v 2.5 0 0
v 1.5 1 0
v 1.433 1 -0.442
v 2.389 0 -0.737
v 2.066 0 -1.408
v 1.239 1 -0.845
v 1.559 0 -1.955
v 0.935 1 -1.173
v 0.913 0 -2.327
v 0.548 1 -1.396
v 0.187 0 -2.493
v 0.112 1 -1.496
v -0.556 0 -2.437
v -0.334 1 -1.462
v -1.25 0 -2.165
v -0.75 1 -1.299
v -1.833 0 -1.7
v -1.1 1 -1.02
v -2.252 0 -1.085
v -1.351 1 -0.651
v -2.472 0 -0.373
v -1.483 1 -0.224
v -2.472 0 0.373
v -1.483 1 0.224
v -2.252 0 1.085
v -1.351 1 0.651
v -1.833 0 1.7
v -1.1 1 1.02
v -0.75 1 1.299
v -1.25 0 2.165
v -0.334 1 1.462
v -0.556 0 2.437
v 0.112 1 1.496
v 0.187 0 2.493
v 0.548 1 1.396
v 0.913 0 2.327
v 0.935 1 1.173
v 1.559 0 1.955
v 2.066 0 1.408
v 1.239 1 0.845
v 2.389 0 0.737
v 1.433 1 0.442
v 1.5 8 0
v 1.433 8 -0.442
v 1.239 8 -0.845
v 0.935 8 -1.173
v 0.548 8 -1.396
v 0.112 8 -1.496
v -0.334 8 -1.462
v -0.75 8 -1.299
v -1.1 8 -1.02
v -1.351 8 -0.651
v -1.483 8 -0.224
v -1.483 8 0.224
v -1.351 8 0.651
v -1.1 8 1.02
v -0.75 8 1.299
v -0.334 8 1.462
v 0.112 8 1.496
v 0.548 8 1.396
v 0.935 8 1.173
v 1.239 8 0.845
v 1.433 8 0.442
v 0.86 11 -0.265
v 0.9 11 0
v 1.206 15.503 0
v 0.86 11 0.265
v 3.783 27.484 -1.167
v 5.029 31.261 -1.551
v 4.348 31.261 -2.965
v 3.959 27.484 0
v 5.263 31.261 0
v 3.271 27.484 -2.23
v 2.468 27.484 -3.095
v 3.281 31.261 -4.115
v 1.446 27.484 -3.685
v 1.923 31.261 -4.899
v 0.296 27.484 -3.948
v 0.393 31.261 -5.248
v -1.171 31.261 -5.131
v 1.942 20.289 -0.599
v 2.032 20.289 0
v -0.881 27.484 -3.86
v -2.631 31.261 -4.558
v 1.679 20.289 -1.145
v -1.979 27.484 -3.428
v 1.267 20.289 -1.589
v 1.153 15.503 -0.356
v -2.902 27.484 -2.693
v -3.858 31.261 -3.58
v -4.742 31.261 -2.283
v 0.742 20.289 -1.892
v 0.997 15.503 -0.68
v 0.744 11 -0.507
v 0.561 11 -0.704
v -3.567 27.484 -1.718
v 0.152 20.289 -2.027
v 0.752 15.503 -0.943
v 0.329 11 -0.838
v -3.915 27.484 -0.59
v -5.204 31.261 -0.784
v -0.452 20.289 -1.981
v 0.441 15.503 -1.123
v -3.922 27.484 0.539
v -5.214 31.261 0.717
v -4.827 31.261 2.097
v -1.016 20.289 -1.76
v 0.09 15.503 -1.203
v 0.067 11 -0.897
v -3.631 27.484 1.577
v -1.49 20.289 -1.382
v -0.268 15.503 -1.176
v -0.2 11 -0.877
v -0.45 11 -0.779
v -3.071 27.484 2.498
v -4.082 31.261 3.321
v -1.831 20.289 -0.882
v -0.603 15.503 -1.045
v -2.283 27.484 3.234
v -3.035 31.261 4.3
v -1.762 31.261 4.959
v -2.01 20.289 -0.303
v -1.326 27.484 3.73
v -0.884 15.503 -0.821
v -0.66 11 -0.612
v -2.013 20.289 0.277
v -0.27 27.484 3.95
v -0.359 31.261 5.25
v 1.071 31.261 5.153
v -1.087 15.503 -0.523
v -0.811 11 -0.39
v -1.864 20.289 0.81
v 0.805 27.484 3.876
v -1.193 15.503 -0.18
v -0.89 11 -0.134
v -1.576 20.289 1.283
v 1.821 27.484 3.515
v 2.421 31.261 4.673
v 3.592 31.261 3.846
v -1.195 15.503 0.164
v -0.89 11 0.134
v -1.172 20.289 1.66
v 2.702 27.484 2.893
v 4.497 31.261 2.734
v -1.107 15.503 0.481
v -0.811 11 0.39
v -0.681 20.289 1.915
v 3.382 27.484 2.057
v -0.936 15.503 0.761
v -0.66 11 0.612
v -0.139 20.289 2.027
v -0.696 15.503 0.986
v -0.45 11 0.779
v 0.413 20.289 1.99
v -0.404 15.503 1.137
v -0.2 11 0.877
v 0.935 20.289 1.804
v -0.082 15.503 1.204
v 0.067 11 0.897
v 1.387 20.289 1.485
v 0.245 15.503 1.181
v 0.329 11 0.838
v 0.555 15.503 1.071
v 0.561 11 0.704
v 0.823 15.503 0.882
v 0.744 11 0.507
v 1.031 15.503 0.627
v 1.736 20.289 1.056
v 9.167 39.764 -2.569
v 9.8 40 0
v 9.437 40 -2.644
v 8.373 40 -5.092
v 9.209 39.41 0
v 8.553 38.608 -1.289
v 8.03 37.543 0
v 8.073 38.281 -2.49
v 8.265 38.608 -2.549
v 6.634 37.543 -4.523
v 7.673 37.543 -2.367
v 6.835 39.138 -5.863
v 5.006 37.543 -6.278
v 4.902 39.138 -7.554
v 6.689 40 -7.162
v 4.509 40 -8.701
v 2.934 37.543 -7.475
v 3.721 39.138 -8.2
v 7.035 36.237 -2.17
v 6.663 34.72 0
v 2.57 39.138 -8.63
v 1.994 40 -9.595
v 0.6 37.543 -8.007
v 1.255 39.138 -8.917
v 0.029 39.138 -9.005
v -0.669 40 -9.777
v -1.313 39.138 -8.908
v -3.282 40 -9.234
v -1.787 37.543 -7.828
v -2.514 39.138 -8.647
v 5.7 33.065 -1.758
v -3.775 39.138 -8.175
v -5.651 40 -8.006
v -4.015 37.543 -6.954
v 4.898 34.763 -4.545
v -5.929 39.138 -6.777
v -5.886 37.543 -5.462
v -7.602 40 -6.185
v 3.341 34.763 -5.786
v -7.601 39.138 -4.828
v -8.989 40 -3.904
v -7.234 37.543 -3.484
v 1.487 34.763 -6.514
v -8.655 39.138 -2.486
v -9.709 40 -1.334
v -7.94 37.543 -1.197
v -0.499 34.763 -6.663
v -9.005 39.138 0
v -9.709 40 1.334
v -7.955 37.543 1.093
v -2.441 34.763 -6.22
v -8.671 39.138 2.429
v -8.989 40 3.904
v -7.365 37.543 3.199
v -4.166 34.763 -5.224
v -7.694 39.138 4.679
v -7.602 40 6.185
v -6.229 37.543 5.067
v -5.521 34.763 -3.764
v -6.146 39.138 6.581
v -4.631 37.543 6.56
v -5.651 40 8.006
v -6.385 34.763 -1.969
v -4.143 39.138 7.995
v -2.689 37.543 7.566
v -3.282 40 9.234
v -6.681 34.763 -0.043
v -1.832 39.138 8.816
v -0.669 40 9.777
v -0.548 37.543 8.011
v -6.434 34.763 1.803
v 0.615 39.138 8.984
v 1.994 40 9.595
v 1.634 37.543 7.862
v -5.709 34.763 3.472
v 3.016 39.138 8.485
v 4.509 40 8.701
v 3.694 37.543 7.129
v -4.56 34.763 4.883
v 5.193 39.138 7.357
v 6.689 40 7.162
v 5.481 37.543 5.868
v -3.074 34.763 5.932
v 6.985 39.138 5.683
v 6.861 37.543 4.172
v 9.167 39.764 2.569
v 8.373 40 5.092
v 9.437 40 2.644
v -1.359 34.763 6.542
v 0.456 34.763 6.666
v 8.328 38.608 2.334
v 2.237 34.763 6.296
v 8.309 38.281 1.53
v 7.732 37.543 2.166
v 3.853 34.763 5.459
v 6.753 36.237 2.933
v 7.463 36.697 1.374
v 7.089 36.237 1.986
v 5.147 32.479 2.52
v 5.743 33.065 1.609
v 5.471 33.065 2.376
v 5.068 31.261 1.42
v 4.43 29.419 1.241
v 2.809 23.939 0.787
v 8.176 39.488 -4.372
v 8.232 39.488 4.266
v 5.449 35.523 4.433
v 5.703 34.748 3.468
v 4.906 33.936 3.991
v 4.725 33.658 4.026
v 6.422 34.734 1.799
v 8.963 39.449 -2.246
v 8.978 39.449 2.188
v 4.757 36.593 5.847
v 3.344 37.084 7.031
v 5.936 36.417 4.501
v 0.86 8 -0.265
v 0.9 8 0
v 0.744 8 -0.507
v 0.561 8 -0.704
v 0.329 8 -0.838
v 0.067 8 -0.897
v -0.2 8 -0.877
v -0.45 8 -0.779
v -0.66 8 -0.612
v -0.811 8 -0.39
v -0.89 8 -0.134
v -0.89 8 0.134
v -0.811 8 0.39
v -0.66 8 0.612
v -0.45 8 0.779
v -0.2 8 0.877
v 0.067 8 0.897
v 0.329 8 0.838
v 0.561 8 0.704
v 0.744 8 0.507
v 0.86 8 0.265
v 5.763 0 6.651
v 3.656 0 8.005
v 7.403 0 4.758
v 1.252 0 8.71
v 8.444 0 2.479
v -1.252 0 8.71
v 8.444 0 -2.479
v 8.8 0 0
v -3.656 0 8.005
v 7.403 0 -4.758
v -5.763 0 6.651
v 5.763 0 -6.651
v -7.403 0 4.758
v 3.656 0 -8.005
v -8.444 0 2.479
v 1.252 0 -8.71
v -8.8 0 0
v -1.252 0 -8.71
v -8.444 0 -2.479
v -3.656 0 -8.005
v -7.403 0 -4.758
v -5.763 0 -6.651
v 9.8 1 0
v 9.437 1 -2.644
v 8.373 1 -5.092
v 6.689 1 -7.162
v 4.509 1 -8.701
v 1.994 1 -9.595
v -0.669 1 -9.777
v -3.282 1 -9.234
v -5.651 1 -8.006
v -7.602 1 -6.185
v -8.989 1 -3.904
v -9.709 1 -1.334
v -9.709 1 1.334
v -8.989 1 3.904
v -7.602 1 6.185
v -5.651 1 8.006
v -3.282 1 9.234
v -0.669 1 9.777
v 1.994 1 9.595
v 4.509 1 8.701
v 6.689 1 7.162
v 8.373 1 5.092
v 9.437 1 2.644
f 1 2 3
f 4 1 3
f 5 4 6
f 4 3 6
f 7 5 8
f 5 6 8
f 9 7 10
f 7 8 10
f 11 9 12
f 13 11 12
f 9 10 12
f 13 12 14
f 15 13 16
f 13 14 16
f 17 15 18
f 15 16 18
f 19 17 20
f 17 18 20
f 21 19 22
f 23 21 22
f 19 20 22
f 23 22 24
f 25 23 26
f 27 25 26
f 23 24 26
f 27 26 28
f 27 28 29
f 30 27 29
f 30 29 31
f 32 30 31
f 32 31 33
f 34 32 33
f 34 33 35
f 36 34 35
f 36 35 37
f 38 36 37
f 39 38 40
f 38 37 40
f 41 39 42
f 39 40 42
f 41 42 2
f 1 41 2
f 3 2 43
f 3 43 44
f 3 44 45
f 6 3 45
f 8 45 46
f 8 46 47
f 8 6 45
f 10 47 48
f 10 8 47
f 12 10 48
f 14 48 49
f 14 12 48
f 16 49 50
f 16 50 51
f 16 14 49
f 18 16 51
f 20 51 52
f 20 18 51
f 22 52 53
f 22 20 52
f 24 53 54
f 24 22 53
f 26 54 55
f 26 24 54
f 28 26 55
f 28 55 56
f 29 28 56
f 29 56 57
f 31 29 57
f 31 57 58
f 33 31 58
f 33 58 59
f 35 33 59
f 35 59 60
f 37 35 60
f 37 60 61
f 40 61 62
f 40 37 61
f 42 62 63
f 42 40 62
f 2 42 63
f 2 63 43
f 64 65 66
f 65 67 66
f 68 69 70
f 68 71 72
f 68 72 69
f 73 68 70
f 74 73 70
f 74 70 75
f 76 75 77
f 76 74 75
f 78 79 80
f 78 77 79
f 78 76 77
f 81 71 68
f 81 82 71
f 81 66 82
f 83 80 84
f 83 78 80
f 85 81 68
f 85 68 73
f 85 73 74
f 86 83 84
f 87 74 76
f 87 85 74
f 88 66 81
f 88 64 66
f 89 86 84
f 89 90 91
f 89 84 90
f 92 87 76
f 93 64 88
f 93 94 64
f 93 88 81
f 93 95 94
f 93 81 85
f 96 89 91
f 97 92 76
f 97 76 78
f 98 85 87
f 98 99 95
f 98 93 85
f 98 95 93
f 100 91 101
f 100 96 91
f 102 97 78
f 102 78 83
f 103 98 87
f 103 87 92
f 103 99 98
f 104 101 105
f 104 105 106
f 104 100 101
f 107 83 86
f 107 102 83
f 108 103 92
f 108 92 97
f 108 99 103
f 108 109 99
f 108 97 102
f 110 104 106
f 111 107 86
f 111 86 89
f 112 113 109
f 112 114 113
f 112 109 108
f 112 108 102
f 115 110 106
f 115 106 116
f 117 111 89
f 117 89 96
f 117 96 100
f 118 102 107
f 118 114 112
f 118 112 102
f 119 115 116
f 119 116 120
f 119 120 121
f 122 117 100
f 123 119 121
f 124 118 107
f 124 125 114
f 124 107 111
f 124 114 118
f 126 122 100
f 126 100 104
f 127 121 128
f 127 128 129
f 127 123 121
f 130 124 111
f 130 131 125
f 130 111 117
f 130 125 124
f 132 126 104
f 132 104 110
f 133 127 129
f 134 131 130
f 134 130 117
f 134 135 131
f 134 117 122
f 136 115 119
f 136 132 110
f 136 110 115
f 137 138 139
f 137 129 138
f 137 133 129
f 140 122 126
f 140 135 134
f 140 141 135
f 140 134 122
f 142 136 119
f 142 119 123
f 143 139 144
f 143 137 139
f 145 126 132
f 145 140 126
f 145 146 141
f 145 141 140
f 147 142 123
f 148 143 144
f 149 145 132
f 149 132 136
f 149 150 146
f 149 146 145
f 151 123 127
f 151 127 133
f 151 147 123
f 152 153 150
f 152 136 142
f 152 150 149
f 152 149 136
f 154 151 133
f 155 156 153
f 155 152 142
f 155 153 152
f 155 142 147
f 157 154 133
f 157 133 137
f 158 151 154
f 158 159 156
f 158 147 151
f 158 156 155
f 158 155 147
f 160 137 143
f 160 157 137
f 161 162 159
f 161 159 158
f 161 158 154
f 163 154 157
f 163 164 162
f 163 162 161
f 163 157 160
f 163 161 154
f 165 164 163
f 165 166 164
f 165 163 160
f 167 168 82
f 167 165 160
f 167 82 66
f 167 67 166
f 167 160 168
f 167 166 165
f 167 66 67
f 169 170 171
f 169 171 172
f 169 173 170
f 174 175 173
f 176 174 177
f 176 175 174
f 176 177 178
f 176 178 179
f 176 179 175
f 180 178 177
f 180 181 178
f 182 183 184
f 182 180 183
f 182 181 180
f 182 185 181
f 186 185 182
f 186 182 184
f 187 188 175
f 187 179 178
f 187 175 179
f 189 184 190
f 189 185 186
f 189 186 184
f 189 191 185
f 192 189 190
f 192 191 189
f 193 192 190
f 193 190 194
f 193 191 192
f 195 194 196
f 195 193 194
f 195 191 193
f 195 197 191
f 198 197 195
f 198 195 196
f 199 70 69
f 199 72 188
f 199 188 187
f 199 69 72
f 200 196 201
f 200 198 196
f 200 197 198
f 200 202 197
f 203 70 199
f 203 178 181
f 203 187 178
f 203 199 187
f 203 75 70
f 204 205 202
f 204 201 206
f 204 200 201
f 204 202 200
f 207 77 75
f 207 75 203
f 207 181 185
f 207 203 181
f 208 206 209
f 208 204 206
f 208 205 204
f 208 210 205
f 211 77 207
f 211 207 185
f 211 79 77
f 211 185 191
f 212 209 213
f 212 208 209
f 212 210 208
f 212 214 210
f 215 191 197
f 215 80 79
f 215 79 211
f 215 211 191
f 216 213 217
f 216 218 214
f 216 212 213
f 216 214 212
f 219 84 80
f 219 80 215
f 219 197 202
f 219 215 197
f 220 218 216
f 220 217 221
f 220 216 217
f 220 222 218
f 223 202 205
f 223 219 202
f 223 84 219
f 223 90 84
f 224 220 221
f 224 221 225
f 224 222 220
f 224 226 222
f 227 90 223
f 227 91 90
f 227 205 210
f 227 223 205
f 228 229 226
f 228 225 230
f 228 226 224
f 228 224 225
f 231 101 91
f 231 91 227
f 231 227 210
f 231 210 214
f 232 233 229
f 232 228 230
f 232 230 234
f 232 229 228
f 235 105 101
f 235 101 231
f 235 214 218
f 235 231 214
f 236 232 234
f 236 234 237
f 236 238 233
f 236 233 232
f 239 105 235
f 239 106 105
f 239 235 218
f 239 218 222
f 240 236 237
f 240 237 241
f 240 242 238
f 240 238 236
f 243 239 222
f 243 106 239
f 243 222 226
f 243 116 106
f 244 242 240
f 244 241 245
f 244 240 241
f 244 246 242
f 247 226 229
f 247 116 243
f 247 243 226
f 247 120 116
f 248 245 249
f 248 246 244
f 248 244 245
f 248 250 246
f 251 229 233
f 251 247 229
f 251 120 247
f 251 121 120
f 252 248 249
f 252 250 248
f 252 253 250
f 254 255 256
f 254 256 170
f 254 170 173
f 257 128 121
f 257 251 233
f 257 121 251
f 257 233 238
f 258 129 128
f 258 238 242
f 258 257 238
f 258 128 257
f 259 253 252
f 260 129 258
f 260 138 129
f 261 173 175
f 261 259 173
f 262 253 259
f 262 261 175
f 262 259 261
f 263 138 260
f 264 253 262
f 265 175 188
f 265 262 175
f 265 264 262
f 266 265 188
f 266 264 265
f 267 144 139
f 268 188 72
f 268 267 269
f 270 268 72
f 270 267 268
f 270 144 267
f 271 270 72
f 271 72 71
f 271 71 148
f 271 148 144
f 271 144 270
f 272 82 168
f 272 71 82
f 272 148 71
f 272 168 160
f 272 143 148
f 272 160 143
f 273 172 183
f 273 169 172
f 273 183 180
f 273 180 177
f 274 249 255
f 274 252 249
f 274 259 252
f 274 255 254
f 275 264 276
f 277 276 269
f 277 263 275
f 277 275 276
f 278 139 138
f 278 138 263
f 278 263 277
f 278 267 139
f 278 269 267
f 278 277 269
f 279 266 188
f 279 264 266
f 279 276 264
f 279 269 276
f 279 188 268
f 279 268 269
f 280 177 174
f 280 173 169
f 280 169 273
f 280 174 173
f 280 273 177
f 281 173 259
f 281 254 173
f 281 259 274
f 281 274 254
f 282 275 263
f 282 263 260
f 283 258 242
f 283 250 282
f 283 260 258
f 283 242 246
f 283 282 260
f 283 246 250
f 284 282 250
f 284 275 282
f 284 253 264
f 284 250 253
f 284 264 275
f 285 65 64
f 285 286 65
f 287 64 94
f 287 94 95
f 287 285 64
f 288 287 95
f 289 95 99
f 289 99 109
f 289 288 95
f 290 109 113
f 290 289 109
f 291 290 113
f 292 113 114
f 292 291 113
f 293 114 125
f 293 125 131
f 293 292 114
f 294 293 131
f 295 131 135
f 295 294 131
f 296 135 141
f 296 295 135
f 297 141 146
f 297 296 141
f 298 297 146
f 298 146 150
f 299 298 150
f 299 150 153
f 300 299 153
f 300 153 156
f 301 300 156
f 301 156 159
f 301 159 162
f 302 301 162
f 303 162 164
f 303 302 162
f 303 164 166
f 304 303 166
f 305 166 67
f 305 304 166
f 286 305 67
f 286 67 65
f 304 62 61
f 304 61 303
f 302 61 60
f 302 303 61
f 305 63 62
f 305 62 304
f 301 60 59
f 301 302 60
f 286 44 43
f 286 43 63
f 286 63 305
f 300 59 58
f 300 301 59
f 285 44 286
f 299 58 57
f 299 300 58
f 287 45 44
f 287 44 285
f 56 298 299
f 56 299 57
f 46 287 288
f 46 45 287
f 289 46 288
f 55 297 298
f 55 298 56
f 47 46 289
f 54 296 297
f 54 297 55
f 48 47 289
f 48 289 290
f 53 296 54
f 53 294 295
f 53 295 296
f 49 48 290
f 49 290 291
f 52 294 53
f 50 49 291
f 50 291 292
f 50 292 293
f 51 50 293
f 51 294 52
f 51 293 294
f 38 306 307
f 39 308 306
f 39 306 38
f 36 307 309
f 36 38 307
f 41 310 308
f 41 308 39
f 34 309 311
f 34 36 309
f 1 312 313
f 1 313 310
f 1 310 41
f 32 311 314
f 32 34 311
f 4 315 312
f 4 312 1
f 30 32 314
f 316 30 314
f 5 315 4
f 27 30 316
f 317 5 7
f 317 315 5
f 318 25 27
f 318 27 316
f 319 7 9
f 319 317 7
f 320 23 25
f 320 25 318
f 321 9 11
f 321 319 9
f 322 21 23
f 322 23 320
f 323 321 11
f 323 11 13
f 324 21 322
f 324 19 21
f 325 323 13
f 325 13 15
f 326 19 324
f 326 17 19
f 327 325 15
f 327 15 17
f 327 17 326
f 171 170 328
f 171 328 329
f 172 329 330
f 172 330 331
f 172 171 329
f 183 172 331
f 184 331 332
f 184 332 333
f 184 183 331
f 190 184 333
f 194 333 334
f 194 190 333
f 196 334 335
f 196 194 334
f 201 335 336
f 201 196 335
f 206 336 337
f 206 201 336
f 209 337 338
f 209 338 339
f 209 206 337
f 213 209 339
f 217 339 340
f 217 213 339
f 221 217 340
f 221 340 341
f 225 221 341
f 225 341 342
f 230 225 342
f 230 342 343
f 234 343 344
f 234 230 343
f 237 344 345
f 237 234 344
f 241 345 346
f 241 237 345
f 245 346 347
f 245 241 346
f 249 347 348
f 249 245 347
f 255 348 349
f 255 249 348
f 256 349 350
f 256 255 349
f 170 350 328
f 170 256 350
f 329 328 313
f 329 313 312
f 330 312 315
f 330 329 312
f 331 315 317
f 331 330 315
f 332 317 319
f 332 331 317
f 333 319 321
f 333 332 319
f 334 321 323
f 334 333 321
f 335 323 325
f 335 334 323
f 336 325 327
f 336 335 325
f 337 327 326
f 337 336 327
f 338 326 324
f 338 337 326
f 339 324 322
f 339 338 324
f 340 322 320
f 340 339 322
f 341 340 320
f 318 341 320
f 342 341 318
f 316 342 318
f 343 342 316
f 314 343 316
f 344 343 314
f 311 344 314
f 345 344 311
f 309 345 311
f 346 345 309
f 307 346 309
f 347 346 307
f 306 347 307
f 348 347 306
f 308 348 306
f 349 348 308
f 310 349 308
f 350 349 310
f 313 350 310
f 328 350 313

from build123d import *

# Parameters (mm, degrees)
CHAMFER_1_SIZE = 1


with BuildPart() as part:
    # Эскиз1 → Повернуть1 (revolve)
    with BuildSketch(Plane.XY):
        with BuildLine():
            Line((1.5, 0), (9.8, 0))
            Line((9.8, 0), (9.8, 40))
            add(Edge.make_bspline(
                [(9.8, 40), (7.453858919, 38.434475284), (0.9, 22), (0.9, 11)],
                knots=[0, 0, 0, 0, 1, 1, 1, 1], degree=3))
            Line((0.9, 11), (0.9, 8))
            Line((0.9, 8), (1.5, 8))
            Line((1.5, 8), (1.5, 0))
        make_face()
    revolve(axis=Axis((0, 0, 0), (0, 1, 0)))

    # Фаска1
    chamfer_1_edges = [part.edges().sort_by_distance(p)[0] for p in [
        (-1.5, 0, 0),
        (-9.8, 0, 0),
    ]]
    chamfer(chamfer_1_edges, length=CHAMFER_1_SIZE)


solid = part.part
